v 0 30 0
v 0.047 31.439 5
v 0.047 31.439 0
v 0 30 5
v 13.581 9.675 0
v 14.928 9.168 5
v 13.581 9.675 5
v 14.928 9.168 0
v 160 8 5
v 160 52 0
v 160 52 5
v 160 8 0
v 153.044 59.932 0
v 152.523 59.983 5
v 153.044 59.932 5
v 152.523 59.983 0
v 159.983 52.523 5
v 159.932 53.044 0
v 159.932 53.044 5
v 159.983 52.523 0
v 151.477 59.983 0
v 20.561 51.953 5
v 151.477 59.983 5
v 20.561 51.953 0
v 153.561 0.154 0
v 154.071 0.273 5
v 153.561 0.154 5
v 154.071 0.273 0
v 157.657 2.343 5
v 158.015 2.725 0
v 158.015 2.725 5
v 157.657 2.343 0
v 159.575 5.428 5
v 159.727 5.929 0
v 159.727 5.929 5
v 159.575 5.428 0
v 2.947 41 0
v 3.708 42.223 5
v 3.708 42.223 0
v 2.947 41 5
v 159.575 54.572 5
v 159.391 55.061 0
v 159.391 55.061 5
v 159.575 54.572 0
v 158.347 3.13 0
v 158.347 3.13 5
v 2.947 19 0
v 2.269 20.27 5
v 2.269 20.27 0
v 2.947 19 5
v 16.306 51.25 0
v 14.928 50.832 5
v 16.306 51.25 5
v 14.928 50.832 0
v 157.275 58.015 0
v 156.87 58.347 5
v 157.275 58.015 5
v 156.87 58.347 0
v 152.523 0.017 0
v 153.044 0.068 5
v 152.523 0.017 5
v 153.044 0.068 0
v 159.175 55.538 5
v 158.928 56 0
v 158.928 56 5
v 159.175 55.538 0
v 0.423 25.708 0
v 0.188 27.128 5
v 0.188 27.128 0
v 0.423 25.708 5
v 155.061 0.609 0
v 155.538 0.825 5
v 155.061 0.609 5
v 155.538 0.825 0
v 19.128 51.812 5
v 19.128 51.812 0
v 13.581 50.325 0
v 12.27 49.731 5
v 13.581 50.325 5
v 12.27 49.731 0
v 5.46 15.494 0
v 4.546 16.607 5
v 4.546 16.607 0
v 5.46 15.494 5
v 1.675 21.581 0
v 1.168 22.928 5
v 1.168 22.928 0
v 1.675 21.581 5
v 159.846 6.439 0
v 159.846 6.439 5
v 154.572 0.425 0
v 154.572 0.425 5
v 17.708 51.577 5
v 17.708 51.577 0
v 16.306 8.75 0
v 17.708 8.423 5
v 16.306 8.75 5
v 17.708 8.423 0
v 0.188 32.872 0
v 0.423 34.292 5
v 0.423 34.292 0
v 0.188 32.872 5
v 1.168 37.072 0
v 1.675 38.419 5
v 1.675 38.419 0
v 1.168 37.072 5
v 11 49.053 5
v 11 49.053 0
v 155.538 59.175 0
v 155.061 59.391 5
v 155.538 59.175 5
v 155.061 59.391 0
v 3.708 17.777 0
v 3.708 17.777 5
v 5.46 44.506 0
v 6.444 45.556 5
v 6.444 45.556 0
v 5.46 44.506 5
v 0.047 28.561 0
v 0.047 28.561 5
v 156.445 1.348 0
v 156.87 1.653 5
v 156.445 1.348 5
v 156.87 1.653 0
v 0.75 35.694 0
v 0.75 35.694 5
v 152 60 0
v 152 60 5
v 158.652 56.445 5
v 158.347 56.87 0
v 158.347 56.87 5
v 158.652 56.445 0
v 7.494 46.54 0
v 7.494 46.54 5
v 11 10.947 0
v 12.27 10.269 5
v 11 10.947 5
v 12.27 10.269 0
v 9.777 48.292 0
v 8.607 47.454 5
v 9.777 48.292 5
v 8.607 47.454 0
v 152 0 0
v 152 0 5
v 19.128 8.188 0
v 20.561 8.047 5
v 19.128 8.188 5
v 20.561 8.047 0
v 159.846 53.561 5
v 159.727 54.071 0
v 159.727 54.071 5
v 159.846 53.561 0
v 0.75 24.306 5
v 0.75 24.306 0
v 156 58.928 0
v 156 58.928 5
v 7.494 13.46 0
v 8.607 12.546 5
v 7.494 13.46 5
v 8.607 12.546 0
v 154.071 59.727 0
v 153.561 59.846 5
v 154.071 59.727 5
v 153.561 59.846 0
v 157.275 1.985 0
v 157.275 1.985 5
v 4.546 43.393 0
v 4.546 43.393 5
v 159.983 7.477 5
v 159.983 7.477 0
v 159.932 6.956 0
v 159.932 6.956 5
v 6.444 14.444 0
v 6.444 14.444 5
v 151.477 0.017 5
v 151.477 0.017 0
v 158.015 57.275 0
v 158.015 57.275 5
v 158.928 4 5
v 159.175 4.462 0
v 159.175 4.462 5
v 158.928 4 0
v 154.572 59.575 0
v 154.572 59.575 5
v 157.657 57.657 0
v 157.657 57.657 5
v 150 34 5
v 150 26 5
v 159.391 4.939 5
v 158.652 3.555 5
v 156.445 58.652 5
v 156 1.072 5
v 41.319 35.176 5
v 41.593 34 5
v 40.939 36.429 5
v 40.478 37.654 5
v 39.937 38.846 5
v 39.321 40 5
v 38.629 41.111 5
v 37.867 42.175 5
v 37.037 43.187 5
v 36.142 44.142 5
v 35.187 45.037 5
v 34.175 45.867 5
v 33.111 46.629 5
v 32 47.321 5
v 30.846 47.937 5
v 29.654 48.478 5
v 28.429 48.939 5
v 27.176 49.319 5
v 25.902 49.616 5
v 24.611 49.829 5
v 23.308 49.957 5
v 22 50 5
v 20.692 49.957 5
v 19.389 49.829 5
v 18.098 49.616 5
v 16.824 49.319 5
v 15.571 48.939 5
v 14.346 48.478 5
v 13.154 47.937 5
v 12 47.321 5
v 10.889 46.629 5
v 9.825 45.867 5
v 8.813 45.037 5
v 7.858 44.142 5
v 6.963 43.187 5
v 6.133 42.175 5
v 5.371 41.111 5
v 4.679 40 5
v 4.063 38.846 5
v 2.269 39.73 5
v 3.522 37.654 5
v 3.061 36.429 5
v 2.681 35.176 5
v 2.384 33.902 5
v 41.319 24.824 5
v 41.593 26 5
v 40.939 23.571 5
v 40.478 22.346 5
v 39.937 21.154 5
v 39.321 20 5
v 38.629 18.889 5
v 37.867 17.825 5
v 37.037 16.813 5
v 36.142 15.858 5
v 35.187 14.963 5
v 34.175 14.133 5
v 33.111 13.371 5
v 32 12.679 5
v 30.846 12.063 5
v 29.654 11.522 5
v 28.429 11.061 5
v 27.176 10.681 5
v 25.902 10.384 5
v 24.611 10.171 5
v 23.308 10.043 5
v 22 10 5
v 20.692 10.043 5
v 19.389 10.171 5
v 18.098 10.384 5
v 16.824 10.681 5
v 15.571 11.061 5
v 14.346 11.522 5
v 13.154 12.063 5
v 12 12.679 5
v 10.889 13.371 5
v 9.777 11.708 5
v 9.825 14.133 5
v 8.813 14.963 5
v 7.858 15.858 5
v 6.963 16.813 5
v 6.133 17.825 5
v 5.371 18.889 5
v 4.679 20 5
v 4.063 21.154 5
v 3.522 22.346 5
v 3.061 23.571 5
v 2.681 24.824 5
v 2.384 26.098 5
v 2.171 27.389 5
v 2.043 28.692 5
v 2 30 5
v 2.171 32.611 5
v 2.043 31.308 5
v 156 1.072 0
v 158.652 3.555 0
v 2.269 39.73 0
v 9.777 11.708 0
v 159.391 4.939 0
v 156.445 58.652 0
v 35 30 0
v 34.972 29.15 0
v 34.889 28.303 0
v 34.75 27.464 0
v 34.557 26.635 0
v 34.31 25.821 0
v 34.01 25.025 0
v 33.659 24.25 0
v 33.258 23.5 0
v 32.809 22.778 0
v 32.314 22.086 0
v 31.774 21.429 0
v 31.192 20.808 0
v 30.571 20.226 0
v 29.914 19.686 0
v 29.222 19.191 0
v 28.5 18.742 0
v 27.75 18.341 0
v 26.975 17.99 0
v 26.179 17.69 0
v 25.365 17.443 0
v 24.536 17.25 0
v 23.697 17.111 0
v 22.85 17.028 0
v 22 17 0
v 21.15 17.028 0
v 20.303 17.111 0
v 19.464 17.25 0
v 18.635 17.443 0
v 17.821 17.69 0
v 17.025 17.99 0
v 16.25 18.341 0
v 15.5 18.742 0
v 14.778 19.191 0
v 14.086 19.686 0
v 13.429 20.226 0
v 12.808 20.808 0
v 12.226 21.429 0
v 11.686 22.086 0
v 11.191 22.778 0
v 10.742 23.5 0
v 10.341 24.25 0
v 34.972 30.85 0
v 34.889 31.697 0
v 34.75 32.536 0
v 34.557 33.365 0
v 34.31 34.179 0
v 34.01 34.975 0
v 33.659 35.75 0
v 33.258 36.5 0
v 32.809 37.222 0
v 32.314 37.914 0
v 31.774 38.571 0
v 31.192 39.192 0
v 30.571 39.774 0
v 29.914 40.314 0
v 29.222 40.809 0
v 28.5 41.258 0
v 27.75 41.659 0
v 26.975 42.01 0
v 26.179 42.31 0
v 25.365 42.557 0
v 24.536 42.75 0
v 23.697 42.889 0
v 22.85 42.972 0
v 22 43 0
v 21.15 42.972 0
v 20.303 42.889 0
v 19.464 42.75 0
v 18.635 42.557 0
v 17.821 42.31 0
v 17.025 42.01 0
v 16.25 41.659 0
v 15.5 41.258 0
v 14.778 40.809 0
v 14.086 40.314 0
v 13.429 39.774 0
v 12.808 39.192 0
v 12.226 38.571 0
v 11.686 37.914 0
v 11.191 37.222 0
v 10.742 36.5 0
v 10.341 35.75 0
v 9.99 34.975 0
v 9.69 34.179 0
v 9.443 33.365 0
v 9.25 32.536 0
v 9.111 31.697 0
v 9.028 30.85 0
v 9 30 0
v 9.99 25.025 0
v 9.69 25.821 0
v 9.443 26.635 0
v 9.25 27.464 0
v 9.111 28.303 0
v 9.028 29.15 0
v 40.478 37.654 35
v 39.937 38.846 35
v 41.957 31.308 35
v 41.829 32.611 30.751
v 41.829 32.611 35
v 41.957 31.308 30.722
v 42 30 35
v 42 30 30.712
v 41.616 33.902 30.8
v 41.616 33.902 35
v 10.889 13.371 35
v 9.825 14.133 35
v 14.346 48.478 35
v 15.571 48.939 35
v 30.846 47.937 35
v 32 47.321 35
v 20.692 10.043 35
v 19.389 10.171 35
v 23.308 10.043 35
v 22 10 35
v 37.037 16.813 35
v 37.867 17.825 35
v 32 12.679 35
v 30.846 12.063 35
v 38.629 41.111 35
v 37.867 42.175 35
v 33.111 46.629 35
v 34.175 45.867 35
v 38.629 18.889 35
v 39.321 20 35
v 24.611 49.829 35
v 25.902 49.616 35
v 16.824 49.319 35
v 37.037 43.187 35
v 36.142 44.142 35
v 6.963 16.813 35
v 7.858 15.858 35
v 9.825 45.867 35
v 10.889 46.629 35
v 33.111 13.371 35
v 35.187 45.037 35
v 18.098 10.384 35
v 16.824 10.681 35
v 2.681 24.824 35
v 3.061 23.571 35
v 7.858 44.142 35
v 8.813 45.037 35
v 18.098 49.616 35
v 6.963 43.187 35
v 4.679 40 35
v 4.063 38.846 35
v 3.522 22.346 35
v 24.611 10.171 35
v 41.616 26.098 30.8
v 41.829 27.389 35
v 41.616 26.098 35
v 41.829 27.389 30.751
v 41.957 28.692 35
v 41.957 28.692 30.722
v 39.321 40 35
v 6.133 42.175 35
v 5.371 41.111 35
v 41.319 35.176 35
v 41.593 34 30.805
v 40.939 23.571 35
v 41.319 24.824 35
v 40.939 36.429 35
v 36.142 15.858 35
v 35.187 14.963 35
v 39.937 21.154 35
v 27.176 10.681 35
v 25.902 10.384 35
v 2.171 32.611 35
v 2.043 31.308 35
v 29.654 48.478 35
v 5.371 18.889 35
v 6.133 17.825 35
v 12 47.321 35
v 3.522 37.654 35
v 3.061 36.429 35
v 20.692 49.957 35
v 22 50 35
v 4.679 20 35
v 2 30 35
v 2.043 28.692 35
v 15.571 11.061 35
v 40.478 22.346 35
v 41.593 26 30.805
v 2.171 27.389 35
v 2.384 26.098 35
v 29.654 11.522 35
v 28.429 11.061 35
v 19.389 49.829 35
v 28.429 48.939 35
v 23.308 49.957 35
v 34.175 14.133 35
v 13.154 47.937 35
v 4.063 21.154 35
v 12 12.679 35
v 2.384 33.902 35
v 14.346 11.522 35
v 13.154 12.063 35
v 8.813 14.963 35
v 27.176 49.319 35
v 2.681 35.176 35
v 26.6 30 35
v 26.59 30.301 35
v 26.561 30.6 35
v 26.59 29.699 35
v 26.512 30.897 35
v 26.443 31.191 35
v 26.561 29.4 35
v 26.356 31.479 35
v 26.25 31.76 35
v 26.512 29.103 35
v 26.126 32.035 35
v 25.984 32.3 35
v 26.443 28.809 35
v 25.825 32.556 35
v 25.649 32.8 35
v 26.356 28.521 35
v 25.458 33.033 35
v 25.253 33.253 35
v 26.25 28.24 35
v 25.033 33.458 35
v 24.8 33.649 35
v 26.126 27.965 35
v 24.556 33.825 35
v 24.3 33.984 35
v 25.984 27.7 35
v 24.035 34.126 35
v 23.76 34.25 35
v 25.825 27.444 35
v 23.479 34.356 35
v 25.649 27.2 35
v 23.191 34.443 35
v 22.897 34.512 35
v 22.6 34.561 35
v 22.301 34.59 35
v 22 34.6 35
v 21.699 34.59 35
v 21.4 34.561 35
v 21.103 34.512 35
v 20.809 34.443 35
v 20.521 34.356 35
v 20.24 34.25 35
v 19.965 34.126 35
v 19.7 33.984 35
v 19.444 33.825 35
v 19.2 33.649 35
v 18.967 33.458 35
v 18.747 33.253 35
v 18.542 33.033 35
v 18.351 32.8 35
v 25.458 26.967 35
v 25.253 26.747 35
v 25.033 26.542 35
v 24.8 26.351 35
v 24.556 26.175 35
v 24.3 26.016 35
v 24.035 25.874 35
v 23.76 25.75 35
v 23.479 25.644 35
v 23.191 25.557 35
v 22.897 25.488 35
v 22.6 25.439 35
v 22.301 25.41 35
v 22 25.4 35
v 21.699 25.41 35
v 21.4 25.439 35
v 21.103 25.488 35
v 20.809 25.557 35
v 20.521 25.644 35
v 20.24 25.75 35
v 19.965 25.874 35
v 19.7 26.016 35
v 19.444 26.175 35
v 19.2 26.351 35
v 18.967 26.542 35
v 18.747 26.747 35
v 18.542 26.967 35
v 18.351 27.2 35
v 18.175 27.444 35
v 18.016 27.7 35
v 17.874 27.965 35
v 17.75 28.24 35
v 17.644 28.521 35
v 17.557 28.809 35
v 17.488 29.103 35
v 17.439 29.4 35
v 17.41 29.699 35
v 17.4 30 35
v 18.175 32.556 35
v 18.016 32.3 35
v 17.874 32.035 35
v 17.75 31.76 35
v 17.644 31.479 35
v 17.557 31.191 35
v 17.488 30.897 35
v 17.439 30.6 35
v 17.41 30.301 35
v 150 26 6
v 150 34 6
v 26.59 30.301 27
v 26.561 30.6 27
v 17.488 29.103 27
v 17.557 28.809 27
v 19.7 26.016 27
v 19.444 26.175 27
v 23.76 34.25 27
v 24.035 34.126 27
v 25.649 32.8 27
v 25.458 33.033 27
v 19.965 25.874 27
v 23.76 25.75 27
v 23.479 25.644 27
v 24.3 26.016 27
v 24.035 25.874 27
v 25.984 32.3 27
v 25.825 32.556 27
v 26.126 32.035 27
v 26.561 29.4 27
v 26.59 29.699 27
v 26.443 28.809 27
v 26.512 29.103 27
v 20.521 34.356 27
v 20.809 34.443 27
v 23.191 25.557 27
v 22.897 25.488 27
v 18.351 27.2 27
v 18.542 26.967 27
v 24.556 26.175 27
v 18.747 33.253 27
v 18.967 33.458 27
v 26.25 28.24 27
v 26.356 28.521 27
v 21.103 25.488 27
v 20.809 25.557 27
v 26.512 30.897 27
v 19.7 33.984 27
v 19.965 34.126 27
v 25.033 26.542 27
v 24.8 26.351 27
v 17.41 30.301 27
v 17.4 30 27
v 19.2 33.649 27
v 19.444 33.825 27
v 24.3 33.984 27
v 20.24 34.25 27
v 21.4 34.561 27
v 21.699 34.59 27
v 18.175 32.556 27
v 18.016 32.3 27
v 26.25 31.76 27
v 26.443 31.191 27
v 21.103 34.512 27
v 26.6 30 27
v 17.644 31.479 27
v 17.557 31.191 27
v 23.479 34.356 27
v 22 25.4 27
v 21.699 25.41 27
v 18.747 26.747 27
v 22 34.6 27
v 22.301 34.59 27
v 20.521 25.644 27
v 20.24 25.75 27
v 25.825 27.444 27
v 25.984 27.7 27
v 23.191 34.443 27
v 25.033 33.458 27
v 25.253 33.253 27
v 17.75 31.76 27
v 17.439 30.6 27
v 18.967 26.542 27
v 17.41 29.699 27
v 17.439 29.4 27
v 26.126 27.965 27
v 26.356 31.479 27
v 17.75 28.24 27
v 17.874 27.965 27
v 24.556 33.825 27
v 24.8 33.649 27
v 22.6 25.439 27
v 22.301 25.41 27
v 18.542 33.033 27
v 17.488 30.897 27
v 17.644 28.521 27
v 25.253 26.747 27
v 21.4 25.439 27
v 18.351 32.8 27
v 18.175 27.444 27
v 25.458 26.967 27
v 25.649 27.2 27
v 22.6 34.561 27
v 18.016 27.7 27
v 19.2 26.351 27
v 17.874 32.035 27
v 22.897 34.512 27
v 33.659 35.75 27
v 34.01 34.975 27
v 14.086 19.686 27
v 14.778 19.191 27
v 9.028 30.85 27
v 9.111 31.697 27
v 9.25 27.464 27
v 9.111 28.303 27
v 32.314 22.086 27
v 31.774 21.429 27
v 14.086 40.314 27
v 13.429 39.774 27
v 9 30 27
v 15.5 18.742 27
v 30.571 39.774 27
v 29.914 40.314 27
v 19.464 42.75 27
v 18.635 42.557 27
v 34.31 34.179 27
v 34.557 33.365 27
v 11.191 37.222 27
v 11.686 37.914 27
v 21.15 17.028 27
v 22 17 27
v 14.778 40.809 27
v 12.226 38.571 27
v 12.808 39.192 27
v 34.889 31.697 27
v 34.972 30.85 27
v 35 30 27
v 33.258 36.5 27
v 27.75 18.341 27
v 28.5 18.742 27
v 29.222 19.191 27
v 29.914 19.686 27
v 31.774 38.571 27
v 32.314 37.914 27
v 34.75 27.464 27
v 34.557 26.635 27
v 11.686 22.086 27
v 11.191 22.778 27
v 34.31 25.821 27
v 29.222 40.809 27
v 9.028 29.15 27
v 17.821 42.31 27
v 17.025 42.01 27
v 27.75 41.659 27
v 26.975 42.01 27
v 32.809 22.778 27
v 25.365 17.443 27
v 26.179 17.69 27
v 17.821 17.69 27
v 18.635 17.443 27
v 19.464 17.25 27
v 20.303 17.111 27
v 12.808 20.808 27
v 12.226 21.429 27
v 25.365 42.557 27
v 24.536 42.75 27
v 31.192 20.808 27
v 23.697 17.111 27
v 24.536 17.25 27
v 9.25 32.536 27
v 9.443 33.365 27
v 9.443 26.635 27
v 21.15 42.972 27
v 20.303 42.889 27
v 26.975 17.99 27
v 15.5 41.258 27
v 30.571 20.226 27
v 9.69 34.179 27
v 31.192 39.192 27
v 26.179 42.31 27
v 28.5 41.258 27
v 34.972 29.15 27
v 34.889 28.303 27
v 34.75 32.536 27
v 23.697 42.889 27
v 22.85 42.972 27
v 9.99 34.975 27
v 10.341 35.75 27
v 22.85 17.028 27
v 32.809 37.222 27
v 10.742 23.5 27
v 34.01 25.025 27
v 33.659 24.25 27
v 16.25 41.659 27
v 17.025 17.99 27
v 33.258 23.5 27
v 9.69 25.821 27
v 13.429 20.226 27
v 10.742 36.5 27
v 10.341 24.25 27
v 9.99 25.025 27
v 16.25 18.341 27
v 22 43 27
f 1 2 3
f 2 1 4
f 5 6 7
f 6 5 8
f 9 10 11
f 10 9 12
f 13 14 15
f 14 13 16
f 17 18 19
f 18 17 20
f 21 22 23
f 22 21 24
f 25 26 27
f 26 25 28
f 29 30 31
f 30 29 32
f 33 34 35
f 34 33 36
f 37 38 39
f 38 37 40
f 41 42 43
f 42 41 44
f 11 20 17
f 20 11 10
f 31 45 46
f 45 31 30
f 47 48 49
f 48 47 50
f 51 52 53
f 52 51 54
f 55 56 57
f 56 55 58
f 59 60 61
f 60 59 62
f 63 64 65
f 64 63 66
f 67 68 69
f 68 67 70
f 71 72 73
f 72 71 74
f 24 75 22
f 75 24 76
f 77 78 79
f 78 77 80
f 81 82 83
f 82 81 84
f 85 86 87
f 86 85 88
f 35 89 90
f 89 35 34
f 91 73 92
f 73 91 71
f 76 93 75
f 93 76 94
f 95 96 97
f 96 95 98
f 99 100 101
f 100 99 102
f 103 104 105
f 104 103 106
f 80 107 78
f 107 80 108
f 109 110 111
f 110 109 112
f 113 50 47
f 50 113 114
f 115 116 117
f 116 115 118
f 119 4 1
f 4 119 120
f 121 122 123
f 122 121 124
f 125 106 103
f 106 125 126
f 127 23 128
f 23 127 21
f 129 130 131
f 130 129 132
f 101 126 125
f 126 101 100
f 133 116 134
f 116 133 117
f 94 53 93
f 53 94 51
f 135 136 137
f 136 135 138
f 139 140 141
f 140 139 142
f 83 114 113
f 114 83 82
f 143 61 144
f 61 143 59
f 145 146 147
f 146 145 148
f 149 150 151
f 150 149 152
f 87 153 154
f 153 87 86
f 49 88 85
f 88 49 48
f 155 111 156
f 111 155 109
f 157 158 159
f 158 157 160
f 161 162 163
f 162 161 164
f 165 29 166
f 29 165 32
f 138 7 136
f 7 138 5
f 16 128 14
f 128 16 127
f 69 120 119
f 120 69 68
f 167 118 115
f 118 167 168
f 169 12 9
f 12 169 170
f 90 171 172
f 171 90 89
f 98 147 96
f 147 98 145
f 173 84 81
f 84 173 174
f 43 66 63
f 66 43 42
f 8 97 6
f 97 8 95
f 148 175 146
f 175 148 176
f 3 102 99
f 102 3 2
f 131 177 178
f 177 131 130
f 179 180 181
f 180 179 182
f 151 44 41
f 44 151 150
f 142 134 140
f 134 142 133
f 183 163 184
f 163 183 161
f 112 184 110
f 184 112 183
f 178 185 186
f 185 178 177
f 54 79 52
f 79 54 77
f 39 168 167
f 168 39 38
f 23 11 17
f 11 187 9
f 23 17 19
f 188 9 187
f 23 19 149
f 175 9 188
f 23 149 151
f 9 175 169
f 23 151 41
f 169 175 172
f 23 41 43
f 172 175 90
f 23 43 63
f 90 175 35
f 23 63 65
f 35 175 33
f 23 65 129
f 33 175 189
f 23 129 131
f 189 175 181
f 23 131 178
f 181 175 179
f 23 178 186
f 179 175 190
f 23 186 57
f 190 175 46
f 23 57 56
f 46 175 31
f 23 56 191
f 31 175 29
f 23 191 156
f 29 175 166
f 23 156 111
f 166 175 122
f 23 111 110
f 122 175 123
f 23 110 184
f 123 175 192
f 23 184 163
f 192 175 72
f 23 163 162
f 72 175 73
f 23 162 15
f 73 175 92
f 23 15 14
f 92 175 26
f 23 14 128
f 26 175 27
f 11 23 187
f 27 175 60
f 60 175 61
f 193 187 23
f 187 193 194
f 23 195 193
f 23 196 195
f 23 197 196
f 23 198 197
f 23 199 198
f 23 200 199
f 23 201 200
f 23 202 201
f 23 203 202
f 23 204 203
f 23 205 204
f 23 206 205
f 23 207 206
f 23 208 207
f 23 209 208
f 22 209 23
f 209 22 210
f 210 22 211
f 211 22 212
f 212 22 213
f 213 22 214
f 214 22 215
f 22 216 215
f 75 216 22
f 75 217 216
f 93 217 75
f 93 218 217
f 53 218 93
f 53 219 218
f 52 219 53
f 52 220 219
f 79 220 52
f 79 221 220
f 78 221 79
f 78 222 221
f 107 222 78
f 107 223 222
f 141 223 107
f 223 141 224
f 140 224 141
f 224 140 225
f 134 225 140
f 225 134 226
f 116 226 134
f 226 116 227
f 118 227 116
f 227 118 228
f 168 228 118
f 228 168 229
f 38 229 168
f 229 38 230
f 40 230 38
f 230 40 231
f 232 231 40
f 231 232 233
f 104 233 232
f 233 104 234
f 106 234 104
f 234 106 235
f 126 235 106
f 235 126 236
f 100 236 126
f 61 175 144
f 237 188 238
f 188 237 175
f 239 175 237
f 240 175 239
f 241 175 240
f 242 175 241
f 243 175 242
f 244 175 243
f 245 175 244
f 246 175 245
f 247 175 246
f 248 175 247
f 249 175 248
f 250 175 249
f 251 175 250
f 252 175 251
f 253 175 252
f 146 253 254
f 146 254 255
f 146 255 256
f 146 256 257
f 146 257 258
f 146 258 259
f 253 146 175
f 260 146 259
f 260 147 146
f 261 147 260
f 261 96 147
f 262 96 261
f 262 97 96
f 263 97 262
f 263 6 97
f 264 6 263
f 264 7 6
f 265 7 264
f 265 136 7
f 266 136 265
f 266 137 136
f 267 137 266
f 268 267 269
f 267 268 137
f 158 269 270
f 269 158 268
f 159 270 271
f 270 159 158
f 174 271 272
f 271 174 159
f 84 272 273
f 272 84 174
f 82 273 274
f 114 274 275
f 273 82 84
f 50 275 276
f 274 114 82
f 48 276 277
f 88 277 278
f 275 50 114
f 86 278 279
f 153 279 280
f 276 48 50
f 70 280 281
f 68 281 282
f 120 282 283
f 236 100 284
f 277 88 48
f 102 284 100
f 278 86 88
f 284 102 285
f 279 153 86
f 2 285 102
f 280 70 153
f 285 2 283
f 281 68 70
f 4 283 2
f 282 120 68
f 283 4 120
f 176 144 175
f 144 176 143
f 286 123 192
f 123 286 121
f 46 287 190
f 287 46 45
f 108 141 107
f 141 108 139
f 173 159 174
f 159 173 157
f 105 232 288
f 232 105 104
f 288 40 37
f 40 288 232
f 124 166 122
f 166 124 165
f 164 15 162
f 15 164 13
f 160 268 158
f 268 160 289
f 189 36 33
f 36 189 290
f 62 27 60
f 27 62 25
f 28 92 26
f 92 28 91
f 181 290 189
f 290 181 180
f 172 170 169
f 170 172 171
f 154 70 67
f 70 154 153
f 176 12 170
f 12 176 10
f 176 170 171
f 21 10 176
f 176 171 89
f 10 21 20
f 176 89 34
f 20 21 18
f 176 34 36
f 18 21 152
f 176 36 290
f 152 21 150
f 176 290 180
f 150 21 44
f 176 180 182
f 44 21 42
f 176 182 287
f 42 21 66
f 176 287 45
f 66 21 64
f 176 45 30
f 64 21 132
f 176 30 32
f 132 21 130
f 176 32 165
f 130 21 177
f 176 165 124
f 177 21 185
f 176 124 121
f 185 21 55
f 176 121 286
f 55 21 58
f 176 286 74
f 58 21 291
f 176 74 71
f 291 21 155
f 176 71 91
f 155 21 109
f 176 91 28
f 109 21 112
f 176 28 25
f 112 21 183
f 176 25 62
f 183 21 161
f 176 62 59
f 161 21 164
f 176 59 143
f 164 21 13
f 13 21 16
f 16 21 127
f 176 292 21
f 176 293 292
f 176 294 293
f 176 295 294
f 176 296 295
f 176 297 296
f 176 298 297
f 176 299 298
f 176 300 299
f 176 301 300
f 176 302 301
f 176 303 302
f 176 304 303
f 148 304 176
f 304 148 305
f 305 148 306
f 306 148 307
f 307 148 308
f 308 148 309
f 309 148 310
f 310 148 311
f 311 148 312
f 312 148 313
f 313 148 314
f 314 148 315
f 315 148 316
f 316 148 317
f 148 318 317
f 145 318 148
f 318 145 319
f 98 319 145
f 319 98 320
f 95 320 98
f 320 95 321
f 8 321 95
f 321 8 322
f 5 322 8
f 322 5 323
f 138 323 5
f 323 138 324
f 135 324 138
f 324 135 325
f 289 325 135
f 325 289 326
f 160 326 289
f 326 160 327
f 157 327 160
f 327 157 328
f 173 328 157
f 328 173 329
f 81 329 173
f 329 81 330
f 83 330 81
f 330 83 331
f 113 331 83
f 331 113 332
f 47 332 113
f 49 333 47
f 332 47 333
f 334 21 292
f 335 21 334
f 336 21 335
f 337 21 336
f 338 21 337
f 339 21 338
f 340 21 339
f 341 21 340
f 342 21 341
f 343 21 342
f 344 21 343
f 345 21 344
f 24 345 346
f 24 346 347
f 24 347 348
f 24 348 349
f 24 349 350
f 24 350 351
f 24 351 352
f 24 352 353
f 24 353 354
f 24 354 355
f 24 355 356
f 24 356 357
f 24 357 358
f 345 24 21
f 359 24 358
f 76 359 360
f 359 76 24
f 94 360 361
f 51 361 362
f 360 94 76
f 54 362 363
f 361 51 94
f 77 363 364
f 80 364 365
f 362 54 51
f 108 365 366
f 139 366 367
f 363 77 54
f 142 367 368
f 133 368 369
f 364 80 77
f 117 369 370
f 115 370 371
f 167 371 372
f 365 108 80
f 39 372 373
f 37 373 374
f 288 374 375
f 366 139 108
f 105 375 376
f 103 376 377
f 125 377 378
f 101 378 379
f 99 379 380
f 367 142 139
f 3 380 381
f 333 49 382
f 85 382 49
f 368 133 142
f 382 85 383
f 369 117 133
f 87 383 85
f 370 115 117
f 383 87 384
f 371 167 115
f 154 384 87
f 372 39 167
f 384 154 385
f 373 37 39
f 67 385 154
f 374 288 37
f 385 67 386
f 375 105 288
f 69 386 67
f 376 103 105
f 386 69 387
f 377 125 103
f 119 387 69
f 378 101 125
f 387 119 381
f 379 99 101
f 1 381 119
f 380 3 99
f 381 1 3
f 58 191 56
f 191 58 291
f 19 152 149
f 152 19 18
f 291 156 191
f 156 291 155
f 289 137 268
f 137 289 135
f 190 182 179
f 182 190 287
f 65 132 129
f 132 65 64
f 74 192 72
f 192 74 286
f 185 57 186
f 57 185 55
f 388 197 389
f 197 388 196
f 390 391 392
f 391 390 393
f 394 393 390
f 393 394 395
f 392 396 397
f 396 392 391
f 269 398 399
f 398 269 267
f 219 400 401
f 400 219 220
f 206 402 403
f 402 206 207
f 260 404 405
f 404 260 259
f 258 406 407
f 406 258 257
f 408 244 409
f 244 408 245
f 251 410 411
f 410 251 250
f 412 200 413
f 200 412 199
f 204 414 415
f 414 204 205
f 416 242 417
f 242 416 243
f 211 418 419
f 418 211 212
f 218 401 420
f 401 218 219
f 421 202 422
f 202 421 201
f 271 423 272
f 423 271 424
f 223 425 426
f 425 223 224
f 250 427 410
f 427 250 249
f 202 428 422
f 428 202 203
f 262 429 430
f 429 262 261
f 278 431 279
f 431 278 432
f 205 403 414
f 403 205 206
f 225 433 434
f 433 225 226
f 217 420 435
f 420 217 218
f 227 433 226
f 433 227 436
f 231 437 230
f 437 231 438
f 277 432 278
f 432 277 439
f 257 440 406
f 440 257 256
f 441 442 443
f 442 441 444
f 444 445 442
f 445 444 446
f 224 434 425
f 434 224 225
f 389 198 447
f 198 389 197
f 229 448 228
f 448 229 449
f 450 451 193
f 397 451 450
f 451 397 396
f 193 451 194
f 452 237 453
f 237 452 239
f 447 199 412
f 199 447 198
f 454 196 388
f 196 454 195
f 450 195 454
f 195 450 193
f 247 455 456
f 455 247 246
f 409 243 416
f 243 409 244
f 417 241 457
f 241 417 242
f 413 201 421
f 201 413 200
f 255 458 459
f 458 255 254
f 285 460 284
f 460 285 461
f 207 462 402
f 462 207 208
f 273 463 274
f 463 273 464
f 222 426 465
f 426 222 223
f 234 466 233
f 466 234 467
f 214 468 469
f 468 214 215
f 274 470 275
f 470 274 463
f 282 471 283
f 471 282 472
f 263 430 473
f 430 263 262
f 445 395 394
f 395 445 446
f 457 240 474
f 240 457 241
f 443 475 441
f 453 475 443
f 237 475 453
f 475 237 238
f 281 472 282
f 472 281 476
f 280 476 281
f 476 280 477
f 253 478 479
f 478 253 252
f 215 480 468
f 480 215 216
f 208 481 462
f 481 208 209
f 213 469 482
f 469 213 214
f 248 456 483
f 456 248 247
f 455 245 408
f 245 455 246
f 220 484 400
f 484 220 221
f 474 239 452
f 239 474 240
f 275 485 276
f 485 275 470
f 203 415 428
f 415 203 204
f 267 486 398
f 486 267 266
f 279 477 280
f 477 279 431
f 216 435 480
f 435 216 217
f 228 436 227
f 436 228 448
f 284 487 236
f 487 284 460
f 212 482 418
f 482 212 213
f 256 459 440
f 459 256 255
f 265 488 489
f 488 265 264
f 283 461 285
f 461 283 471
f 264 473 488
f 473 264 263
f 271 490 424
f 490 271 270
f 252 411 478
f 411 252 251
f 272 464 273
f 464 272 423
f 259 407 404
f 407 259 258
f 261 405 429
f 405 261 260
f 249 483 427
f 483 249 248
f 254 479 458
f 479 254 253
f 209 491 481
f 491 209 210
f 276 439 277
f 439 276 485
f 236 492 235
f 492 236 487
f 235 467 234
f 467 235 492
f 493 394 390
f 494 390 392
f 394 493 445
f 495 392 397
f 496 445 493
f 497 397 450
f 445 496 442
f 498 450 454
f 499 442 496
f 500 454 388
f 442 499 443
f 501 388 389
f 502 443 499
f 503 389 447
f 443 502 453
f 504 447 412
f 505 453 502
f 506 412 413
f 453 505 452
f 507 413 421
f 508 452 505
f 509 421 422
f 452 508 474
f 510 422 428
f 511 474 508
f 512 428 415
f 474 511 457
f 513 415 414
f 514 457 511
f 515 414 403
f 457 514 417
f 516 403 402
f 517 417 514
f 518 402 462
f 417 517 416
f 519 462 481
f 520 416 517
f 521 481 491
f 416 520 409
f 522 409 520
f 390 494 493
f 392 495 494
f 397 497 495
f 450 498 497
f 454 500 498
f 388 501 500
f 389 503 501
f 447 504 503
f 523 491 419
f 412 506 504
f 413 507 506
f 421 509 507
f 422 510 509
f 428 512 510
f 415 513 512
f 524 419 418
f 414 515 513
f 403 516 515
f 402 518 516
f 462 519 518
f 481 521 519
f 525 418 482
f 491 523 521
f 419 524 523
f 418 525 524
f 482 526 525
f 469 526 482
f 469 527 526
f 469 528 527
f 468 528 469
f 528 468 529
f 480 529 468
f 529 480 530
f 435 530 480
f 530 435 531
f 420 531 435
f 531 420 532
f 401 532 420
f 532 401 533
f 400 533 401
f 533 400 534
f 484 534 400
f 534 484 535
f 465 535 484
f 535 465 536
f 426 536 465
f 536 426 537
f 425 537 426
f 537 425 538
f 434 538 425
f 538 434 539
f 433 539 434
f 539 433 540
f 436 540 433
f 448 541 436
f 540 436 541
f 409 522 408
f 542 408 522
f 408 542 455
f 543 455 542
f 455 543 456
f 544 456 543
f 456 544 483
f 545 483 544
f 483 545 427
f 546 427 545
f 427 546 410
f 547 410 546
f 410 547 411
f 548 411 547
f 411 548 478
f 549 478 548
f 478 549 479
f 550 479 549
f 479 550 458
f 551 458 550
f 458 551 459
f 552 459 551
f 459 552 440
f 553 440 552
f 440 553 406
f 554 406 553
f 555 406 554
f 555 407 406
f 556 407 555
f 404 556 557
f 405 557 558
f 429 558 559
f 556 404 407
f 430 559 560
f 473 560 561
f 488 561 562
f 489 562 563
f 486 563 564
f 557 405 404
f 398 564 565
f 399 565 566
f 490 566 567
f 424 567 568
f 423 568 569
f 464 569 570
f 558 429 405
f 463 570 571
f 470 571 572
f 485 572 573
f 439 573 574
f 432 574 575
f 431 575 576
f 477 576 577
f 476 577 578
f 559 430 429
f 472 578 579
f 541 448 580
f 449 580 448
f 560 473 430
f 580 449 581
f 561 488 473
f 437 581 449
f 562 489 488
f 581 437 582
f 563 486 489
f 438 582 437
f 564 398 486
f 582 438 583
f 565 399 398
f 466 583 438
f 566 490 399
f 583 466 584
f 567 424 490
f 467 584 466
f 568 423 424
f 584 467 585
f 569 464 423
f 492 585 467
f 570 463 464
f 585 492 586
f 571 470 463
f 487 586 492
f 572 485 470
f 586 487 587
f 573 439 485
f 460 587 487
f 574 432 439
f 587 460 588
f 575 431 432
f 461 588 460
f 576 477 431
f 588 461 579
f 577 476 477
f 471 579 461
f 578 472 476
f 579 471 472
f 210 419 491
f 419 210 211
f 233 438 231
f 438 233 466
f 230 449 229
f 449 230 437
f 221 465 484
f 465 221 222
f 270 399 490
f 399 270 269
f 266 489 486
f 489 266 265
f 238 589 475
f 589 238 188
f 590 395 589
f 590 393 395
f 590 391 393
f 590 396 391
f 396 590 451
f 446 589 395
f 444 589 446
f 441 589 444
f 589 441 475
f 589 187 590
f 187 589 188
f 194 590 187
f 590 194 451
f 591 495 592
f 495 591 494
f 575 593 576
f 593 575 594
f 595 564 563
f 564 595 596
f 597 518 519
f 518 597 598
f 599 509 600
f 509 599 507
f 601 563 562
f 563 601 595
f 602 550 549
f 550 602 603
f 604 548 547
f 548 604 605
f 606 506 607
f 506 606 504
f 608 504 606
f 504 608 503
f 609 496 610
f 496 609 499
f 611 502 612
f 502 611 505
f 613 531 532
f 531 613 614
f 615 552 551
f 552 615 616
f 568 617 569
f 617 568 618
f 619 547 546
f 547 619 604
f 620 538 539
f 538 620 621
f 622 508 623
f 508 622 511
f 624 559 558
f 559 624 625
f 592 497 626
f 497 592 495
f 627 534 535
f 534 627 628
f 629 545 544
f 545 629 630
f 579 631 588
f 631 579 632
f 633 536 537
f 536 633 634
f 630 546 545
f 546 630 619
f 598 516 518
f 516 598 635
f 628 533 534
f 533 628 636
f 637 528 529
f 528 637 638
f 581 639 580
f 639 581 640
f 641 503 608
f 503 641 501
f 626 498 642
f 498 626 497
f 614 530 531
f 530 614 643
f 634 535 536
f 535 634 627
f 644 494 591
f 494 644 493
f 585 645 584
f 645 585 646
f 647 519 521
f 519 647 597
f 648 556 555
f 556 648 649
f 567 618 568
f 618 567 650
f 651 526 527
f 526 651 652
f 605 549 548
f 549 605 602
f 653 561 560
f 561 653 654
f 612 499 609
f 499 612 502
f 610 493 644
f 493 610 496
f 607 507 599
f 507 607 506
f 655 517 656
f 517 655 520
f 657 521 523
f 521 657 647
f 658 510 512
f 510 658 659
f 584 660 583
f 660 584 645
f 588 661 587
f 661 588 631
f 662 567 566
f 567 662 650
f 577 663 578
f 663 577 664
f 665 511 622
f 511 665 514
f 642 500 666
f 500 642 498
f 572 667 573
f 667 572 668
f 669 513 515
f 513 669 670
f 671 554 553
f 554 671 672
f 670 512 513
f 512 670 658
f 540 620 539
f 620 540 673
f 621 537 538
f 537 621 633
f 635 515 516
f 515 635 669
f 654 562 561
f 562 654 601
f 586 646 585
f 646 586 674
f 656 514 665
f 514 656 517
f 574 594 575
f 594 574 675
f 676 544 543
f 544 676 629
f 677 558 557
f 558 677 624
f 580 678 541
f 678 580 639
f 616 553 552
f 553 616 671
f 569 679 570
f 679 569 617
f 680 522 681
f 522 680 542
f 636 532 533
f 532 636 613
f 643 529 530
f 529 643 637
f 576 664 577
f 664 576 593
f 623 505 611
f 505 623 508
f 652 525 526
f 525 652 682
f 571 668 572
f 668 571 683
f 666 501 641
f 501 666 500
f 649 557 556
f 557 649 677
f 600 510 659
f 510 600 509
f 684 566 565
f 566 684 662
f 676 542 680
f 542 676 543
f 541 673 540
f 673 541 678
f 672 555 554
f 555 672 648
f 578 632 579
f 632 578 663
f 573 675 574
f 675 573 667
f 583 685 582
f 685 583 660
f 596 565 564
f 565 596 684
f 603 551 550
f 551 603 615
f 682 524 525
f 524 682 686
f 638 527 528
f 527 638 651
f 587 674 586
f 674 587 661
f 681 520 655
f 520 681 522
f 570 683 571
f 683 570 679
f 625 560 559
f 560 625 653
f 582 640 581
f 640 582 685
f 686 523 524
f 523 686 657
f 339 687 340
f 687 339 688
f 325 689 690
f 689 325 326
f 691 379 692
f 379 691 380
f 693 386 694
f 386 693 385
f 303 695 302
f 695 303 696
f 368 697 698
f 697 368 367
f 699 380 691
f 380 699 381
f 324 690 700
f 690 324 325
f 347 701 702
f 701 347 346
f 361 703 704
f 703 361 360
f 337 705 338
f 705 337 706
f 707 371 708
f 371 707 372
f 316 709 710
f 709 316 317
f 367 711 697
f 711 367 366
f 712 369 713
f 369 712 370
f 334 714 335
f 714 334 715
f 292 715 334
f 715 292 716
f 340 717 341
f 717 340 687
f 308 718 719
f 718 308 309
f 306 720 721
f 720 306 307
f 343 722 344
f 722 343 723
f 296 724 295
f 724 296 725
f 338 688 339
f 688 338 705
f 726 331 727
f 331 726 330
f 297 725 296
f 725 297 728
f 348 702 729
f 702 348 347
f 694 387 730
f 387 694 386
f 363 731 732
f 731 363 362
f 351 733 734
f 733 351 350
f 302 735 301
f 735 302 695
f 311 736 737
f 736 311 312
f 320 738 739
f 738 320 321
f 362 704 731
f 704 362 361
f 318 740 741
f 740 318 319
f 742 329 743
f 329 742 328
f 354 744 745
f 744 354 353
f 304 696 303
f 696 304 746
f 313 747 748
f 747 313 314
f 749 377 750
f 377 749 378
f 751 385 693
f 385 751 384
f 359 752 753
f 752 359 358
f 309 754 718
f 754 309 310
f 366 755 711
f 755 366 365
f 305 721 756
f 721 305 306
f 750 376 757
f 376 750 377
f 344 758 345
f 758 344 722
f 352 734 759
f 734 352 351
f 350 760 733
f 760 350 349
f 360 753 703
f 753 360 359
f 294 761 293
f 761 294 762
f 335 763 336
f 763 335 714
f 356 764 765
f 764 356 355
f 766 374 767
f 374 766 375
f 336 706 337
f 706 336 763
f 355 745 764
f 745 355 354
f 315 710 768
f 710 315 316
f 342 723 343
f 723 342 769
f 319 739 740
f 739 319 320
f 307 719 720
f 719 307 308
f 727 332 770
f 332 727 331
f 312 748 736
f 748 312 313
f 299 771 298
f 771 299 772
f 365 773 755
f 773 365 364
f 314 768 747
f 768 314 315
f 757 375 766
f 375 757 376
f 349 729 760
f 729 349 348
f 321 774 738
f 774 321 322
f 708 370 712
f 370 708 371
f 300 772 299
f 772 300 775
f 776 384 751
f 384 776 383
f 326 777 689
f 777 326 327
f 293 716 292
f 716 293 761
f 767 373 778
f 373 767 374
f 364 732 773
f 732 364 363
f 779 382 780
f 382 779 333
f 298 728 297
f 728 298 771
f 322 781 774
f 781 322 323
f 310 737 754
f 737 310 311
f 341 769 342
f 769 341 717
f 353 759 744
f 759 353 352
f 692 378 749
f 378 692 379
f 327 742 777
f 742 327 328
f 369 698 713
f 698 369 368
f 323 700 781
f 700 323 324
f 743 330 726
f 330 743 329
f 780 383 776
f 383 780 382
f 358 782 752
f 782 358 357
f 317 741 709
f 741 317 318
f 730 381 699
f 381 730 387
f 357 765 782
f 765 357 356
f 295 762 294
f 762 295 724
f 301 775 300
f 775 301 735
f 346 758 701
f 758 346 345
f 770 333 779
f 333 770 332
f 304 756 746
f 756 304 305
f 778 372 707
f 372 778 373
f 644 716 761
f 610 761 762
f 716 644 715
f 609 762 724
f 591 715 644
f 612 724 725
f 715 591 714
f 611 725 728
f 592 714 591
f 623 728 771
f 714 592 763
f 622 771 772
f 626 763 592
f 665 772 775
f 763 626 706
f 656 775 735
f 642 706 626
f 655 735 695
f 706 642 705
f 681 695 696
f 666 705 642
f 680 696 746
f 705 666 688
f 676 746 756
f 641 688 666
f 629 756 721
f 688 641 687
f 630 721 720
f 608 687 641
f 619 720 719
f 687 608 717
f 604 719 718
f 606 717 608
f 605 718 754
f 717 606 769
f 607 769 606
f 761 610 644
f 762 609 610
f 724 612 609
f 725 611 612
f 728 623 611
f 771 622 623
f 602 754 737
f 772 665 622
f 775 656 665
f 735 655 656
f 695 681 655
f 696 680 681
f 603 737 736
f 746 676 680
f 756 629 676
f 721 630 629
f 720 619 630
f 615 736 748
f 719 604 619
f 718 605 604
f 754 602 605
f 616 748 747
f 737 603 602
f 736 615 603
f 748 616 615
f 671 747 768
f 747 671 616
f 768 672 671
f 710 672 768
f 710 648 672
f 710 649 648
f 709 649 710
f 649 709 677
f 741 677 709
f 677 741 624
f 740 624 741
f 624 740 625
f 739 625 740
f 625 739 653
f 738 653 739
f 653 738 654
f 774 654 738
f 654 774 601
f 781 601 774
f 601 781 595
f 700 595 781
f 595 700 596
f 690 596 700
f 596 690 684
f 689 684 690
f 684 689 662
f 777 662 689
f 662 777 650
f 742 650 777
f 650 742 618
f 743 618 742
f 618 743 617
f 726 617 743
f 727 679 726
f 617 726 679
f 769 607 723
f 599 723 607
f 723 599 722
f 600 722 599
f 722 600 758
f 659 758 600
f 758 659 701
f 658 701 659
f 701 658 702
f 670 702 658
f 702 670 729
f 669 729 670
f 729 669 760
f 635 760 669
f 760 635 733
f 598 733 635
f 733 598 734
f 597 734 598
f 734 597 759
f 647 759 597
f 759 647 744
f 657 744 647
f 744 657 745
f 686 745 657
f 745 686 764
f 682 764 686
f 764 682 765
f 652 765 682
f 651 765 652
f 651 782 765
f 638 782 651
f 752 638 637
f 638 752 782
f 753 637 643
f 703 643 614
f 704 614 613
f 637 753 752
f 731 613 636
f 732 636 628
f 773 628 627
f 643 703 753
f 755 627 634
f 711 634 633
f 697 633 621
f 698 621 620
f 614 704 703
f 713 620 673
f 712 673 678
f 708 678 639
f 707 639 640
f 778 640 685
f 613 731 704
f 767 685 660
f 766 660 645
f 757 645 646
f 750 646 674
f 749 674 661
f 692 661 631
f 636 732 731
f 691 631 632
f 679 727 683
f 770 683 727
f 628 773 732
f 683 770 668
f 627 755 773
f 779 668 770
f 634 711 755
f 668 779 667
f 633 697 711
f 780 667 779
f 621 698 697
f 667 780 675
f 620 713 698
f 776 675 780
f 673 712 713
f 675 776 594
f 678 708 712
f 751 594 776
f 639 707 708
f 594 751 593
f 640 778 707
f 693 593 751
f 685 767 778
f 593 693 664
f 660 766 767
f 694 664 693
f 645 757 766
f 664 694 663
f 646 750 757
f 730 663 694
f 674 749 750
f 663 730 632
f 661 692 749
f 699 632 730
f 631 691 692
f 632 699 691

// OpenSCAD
// file: ../../lib/winch-desk-feet.scad
// ARBI passive winch desk feet 0.1.0 - concept-unvalidated.
// Millimetres. Licence: AGPL-3.0-only.
// Print two "short" and two "long". Flat soles at Z=0.
// Geometry reference: gredice/arbi d8235b0e2f42ad4c10463550c660321c79408fa9
// hardware/lib/winch-mount.scad: passive 550 x 180 x 8 base,
// post hole pattern 50 x 120, centres (148.45/198.45, 30/150) from edges.
// Bench prototype for unloaded desk checks; not a cable-load fixture.

wdf_height = 35;
wdf_base_thickness = 5;
wdf_short_length = 160;
wdf_long_length = 244;
wdf_boss_d = 40;
wdf_bolt_d = 9.2;
wdf_bolt_from_end = 22;
wdf_nut_access_d = 26;
wdf_roof_thickness = 8;
wdf_rib_width = 8;

wdf_eps = 0.05;

assert(wdf_height >= 30);
assert(wdf_roof_thickness >= 8);
assert(wdf_boss_d >= wdf_nut_access_d + 12);

module wdf_sole_2d(length) {
    // Broad end pads and a narrower connecting strip.
    hull() {
        translate([0,0]) circle(d=44,$fn=96);
        for (y=[-22,22]) translate([length-wdf_bolt_from_end-8,y]) circle(r=8,$fn=96);
    }
}

module wdf_foot(length) {
    difference() {
        union() {
            linear_extrude(wdf_base_thickness) wdf_sole_2d(length);
            cylinder(d=wdf_boss_d,h=wdf_height,$fn=96);
            // Two-sided central buttress; printed vertically above the sole.
            translate([0,wdf_rib_width/2,0]) rotate([90,0,0])
                linear_extrude(wdf_rib_width)
                    polygon([[10,wdf_base_thickness-wdf_eps],
                             [10,wdf_height-2],
                             [length-wdf_bolt_from_end-10,wdf_base_thickness+1],
                             [length-wdf_bolt_from_end-10,wdf_base_thickness-wdf_eps]]);
        }
        translate([0,0,-wdf_eps]) cylinder(d=wdf_bolt_d,h=wdf_height+2*wdf_eps,$fn=96);
        // Recess holds a standard M8 washer/nut entirely above the desk.
        // Generate build-plate-only support in this pocket if bridging is poor.
        translate([0,0,-wdf_eps]) cylinder(d=wdf_nut_access_d,h=wdf_height-wdf_roof_thickness+wdf_eps,$fn=96);
    }
}

module wdf_print_foot(length) {
    translate([wdf_bolt_from_end,30,0]) wdf_foot(length);
}

module wdf_installed_feet() {
    for(y=[30,150]) {
        translate([148.45,y,0]) rotate([0,0,180]) wdf_foot(wdf_short_length);
        translate([198.45,y,0]) wdf_foot(wdf_long_length);
    }
}
// main file
// winch-desk-foot-short 0.1.0 - concept-unvalidated. Print two for one passive base.
include <../../lib/winch-desk-feet.scad>
wdf_print_foot(wdf_short_length);
